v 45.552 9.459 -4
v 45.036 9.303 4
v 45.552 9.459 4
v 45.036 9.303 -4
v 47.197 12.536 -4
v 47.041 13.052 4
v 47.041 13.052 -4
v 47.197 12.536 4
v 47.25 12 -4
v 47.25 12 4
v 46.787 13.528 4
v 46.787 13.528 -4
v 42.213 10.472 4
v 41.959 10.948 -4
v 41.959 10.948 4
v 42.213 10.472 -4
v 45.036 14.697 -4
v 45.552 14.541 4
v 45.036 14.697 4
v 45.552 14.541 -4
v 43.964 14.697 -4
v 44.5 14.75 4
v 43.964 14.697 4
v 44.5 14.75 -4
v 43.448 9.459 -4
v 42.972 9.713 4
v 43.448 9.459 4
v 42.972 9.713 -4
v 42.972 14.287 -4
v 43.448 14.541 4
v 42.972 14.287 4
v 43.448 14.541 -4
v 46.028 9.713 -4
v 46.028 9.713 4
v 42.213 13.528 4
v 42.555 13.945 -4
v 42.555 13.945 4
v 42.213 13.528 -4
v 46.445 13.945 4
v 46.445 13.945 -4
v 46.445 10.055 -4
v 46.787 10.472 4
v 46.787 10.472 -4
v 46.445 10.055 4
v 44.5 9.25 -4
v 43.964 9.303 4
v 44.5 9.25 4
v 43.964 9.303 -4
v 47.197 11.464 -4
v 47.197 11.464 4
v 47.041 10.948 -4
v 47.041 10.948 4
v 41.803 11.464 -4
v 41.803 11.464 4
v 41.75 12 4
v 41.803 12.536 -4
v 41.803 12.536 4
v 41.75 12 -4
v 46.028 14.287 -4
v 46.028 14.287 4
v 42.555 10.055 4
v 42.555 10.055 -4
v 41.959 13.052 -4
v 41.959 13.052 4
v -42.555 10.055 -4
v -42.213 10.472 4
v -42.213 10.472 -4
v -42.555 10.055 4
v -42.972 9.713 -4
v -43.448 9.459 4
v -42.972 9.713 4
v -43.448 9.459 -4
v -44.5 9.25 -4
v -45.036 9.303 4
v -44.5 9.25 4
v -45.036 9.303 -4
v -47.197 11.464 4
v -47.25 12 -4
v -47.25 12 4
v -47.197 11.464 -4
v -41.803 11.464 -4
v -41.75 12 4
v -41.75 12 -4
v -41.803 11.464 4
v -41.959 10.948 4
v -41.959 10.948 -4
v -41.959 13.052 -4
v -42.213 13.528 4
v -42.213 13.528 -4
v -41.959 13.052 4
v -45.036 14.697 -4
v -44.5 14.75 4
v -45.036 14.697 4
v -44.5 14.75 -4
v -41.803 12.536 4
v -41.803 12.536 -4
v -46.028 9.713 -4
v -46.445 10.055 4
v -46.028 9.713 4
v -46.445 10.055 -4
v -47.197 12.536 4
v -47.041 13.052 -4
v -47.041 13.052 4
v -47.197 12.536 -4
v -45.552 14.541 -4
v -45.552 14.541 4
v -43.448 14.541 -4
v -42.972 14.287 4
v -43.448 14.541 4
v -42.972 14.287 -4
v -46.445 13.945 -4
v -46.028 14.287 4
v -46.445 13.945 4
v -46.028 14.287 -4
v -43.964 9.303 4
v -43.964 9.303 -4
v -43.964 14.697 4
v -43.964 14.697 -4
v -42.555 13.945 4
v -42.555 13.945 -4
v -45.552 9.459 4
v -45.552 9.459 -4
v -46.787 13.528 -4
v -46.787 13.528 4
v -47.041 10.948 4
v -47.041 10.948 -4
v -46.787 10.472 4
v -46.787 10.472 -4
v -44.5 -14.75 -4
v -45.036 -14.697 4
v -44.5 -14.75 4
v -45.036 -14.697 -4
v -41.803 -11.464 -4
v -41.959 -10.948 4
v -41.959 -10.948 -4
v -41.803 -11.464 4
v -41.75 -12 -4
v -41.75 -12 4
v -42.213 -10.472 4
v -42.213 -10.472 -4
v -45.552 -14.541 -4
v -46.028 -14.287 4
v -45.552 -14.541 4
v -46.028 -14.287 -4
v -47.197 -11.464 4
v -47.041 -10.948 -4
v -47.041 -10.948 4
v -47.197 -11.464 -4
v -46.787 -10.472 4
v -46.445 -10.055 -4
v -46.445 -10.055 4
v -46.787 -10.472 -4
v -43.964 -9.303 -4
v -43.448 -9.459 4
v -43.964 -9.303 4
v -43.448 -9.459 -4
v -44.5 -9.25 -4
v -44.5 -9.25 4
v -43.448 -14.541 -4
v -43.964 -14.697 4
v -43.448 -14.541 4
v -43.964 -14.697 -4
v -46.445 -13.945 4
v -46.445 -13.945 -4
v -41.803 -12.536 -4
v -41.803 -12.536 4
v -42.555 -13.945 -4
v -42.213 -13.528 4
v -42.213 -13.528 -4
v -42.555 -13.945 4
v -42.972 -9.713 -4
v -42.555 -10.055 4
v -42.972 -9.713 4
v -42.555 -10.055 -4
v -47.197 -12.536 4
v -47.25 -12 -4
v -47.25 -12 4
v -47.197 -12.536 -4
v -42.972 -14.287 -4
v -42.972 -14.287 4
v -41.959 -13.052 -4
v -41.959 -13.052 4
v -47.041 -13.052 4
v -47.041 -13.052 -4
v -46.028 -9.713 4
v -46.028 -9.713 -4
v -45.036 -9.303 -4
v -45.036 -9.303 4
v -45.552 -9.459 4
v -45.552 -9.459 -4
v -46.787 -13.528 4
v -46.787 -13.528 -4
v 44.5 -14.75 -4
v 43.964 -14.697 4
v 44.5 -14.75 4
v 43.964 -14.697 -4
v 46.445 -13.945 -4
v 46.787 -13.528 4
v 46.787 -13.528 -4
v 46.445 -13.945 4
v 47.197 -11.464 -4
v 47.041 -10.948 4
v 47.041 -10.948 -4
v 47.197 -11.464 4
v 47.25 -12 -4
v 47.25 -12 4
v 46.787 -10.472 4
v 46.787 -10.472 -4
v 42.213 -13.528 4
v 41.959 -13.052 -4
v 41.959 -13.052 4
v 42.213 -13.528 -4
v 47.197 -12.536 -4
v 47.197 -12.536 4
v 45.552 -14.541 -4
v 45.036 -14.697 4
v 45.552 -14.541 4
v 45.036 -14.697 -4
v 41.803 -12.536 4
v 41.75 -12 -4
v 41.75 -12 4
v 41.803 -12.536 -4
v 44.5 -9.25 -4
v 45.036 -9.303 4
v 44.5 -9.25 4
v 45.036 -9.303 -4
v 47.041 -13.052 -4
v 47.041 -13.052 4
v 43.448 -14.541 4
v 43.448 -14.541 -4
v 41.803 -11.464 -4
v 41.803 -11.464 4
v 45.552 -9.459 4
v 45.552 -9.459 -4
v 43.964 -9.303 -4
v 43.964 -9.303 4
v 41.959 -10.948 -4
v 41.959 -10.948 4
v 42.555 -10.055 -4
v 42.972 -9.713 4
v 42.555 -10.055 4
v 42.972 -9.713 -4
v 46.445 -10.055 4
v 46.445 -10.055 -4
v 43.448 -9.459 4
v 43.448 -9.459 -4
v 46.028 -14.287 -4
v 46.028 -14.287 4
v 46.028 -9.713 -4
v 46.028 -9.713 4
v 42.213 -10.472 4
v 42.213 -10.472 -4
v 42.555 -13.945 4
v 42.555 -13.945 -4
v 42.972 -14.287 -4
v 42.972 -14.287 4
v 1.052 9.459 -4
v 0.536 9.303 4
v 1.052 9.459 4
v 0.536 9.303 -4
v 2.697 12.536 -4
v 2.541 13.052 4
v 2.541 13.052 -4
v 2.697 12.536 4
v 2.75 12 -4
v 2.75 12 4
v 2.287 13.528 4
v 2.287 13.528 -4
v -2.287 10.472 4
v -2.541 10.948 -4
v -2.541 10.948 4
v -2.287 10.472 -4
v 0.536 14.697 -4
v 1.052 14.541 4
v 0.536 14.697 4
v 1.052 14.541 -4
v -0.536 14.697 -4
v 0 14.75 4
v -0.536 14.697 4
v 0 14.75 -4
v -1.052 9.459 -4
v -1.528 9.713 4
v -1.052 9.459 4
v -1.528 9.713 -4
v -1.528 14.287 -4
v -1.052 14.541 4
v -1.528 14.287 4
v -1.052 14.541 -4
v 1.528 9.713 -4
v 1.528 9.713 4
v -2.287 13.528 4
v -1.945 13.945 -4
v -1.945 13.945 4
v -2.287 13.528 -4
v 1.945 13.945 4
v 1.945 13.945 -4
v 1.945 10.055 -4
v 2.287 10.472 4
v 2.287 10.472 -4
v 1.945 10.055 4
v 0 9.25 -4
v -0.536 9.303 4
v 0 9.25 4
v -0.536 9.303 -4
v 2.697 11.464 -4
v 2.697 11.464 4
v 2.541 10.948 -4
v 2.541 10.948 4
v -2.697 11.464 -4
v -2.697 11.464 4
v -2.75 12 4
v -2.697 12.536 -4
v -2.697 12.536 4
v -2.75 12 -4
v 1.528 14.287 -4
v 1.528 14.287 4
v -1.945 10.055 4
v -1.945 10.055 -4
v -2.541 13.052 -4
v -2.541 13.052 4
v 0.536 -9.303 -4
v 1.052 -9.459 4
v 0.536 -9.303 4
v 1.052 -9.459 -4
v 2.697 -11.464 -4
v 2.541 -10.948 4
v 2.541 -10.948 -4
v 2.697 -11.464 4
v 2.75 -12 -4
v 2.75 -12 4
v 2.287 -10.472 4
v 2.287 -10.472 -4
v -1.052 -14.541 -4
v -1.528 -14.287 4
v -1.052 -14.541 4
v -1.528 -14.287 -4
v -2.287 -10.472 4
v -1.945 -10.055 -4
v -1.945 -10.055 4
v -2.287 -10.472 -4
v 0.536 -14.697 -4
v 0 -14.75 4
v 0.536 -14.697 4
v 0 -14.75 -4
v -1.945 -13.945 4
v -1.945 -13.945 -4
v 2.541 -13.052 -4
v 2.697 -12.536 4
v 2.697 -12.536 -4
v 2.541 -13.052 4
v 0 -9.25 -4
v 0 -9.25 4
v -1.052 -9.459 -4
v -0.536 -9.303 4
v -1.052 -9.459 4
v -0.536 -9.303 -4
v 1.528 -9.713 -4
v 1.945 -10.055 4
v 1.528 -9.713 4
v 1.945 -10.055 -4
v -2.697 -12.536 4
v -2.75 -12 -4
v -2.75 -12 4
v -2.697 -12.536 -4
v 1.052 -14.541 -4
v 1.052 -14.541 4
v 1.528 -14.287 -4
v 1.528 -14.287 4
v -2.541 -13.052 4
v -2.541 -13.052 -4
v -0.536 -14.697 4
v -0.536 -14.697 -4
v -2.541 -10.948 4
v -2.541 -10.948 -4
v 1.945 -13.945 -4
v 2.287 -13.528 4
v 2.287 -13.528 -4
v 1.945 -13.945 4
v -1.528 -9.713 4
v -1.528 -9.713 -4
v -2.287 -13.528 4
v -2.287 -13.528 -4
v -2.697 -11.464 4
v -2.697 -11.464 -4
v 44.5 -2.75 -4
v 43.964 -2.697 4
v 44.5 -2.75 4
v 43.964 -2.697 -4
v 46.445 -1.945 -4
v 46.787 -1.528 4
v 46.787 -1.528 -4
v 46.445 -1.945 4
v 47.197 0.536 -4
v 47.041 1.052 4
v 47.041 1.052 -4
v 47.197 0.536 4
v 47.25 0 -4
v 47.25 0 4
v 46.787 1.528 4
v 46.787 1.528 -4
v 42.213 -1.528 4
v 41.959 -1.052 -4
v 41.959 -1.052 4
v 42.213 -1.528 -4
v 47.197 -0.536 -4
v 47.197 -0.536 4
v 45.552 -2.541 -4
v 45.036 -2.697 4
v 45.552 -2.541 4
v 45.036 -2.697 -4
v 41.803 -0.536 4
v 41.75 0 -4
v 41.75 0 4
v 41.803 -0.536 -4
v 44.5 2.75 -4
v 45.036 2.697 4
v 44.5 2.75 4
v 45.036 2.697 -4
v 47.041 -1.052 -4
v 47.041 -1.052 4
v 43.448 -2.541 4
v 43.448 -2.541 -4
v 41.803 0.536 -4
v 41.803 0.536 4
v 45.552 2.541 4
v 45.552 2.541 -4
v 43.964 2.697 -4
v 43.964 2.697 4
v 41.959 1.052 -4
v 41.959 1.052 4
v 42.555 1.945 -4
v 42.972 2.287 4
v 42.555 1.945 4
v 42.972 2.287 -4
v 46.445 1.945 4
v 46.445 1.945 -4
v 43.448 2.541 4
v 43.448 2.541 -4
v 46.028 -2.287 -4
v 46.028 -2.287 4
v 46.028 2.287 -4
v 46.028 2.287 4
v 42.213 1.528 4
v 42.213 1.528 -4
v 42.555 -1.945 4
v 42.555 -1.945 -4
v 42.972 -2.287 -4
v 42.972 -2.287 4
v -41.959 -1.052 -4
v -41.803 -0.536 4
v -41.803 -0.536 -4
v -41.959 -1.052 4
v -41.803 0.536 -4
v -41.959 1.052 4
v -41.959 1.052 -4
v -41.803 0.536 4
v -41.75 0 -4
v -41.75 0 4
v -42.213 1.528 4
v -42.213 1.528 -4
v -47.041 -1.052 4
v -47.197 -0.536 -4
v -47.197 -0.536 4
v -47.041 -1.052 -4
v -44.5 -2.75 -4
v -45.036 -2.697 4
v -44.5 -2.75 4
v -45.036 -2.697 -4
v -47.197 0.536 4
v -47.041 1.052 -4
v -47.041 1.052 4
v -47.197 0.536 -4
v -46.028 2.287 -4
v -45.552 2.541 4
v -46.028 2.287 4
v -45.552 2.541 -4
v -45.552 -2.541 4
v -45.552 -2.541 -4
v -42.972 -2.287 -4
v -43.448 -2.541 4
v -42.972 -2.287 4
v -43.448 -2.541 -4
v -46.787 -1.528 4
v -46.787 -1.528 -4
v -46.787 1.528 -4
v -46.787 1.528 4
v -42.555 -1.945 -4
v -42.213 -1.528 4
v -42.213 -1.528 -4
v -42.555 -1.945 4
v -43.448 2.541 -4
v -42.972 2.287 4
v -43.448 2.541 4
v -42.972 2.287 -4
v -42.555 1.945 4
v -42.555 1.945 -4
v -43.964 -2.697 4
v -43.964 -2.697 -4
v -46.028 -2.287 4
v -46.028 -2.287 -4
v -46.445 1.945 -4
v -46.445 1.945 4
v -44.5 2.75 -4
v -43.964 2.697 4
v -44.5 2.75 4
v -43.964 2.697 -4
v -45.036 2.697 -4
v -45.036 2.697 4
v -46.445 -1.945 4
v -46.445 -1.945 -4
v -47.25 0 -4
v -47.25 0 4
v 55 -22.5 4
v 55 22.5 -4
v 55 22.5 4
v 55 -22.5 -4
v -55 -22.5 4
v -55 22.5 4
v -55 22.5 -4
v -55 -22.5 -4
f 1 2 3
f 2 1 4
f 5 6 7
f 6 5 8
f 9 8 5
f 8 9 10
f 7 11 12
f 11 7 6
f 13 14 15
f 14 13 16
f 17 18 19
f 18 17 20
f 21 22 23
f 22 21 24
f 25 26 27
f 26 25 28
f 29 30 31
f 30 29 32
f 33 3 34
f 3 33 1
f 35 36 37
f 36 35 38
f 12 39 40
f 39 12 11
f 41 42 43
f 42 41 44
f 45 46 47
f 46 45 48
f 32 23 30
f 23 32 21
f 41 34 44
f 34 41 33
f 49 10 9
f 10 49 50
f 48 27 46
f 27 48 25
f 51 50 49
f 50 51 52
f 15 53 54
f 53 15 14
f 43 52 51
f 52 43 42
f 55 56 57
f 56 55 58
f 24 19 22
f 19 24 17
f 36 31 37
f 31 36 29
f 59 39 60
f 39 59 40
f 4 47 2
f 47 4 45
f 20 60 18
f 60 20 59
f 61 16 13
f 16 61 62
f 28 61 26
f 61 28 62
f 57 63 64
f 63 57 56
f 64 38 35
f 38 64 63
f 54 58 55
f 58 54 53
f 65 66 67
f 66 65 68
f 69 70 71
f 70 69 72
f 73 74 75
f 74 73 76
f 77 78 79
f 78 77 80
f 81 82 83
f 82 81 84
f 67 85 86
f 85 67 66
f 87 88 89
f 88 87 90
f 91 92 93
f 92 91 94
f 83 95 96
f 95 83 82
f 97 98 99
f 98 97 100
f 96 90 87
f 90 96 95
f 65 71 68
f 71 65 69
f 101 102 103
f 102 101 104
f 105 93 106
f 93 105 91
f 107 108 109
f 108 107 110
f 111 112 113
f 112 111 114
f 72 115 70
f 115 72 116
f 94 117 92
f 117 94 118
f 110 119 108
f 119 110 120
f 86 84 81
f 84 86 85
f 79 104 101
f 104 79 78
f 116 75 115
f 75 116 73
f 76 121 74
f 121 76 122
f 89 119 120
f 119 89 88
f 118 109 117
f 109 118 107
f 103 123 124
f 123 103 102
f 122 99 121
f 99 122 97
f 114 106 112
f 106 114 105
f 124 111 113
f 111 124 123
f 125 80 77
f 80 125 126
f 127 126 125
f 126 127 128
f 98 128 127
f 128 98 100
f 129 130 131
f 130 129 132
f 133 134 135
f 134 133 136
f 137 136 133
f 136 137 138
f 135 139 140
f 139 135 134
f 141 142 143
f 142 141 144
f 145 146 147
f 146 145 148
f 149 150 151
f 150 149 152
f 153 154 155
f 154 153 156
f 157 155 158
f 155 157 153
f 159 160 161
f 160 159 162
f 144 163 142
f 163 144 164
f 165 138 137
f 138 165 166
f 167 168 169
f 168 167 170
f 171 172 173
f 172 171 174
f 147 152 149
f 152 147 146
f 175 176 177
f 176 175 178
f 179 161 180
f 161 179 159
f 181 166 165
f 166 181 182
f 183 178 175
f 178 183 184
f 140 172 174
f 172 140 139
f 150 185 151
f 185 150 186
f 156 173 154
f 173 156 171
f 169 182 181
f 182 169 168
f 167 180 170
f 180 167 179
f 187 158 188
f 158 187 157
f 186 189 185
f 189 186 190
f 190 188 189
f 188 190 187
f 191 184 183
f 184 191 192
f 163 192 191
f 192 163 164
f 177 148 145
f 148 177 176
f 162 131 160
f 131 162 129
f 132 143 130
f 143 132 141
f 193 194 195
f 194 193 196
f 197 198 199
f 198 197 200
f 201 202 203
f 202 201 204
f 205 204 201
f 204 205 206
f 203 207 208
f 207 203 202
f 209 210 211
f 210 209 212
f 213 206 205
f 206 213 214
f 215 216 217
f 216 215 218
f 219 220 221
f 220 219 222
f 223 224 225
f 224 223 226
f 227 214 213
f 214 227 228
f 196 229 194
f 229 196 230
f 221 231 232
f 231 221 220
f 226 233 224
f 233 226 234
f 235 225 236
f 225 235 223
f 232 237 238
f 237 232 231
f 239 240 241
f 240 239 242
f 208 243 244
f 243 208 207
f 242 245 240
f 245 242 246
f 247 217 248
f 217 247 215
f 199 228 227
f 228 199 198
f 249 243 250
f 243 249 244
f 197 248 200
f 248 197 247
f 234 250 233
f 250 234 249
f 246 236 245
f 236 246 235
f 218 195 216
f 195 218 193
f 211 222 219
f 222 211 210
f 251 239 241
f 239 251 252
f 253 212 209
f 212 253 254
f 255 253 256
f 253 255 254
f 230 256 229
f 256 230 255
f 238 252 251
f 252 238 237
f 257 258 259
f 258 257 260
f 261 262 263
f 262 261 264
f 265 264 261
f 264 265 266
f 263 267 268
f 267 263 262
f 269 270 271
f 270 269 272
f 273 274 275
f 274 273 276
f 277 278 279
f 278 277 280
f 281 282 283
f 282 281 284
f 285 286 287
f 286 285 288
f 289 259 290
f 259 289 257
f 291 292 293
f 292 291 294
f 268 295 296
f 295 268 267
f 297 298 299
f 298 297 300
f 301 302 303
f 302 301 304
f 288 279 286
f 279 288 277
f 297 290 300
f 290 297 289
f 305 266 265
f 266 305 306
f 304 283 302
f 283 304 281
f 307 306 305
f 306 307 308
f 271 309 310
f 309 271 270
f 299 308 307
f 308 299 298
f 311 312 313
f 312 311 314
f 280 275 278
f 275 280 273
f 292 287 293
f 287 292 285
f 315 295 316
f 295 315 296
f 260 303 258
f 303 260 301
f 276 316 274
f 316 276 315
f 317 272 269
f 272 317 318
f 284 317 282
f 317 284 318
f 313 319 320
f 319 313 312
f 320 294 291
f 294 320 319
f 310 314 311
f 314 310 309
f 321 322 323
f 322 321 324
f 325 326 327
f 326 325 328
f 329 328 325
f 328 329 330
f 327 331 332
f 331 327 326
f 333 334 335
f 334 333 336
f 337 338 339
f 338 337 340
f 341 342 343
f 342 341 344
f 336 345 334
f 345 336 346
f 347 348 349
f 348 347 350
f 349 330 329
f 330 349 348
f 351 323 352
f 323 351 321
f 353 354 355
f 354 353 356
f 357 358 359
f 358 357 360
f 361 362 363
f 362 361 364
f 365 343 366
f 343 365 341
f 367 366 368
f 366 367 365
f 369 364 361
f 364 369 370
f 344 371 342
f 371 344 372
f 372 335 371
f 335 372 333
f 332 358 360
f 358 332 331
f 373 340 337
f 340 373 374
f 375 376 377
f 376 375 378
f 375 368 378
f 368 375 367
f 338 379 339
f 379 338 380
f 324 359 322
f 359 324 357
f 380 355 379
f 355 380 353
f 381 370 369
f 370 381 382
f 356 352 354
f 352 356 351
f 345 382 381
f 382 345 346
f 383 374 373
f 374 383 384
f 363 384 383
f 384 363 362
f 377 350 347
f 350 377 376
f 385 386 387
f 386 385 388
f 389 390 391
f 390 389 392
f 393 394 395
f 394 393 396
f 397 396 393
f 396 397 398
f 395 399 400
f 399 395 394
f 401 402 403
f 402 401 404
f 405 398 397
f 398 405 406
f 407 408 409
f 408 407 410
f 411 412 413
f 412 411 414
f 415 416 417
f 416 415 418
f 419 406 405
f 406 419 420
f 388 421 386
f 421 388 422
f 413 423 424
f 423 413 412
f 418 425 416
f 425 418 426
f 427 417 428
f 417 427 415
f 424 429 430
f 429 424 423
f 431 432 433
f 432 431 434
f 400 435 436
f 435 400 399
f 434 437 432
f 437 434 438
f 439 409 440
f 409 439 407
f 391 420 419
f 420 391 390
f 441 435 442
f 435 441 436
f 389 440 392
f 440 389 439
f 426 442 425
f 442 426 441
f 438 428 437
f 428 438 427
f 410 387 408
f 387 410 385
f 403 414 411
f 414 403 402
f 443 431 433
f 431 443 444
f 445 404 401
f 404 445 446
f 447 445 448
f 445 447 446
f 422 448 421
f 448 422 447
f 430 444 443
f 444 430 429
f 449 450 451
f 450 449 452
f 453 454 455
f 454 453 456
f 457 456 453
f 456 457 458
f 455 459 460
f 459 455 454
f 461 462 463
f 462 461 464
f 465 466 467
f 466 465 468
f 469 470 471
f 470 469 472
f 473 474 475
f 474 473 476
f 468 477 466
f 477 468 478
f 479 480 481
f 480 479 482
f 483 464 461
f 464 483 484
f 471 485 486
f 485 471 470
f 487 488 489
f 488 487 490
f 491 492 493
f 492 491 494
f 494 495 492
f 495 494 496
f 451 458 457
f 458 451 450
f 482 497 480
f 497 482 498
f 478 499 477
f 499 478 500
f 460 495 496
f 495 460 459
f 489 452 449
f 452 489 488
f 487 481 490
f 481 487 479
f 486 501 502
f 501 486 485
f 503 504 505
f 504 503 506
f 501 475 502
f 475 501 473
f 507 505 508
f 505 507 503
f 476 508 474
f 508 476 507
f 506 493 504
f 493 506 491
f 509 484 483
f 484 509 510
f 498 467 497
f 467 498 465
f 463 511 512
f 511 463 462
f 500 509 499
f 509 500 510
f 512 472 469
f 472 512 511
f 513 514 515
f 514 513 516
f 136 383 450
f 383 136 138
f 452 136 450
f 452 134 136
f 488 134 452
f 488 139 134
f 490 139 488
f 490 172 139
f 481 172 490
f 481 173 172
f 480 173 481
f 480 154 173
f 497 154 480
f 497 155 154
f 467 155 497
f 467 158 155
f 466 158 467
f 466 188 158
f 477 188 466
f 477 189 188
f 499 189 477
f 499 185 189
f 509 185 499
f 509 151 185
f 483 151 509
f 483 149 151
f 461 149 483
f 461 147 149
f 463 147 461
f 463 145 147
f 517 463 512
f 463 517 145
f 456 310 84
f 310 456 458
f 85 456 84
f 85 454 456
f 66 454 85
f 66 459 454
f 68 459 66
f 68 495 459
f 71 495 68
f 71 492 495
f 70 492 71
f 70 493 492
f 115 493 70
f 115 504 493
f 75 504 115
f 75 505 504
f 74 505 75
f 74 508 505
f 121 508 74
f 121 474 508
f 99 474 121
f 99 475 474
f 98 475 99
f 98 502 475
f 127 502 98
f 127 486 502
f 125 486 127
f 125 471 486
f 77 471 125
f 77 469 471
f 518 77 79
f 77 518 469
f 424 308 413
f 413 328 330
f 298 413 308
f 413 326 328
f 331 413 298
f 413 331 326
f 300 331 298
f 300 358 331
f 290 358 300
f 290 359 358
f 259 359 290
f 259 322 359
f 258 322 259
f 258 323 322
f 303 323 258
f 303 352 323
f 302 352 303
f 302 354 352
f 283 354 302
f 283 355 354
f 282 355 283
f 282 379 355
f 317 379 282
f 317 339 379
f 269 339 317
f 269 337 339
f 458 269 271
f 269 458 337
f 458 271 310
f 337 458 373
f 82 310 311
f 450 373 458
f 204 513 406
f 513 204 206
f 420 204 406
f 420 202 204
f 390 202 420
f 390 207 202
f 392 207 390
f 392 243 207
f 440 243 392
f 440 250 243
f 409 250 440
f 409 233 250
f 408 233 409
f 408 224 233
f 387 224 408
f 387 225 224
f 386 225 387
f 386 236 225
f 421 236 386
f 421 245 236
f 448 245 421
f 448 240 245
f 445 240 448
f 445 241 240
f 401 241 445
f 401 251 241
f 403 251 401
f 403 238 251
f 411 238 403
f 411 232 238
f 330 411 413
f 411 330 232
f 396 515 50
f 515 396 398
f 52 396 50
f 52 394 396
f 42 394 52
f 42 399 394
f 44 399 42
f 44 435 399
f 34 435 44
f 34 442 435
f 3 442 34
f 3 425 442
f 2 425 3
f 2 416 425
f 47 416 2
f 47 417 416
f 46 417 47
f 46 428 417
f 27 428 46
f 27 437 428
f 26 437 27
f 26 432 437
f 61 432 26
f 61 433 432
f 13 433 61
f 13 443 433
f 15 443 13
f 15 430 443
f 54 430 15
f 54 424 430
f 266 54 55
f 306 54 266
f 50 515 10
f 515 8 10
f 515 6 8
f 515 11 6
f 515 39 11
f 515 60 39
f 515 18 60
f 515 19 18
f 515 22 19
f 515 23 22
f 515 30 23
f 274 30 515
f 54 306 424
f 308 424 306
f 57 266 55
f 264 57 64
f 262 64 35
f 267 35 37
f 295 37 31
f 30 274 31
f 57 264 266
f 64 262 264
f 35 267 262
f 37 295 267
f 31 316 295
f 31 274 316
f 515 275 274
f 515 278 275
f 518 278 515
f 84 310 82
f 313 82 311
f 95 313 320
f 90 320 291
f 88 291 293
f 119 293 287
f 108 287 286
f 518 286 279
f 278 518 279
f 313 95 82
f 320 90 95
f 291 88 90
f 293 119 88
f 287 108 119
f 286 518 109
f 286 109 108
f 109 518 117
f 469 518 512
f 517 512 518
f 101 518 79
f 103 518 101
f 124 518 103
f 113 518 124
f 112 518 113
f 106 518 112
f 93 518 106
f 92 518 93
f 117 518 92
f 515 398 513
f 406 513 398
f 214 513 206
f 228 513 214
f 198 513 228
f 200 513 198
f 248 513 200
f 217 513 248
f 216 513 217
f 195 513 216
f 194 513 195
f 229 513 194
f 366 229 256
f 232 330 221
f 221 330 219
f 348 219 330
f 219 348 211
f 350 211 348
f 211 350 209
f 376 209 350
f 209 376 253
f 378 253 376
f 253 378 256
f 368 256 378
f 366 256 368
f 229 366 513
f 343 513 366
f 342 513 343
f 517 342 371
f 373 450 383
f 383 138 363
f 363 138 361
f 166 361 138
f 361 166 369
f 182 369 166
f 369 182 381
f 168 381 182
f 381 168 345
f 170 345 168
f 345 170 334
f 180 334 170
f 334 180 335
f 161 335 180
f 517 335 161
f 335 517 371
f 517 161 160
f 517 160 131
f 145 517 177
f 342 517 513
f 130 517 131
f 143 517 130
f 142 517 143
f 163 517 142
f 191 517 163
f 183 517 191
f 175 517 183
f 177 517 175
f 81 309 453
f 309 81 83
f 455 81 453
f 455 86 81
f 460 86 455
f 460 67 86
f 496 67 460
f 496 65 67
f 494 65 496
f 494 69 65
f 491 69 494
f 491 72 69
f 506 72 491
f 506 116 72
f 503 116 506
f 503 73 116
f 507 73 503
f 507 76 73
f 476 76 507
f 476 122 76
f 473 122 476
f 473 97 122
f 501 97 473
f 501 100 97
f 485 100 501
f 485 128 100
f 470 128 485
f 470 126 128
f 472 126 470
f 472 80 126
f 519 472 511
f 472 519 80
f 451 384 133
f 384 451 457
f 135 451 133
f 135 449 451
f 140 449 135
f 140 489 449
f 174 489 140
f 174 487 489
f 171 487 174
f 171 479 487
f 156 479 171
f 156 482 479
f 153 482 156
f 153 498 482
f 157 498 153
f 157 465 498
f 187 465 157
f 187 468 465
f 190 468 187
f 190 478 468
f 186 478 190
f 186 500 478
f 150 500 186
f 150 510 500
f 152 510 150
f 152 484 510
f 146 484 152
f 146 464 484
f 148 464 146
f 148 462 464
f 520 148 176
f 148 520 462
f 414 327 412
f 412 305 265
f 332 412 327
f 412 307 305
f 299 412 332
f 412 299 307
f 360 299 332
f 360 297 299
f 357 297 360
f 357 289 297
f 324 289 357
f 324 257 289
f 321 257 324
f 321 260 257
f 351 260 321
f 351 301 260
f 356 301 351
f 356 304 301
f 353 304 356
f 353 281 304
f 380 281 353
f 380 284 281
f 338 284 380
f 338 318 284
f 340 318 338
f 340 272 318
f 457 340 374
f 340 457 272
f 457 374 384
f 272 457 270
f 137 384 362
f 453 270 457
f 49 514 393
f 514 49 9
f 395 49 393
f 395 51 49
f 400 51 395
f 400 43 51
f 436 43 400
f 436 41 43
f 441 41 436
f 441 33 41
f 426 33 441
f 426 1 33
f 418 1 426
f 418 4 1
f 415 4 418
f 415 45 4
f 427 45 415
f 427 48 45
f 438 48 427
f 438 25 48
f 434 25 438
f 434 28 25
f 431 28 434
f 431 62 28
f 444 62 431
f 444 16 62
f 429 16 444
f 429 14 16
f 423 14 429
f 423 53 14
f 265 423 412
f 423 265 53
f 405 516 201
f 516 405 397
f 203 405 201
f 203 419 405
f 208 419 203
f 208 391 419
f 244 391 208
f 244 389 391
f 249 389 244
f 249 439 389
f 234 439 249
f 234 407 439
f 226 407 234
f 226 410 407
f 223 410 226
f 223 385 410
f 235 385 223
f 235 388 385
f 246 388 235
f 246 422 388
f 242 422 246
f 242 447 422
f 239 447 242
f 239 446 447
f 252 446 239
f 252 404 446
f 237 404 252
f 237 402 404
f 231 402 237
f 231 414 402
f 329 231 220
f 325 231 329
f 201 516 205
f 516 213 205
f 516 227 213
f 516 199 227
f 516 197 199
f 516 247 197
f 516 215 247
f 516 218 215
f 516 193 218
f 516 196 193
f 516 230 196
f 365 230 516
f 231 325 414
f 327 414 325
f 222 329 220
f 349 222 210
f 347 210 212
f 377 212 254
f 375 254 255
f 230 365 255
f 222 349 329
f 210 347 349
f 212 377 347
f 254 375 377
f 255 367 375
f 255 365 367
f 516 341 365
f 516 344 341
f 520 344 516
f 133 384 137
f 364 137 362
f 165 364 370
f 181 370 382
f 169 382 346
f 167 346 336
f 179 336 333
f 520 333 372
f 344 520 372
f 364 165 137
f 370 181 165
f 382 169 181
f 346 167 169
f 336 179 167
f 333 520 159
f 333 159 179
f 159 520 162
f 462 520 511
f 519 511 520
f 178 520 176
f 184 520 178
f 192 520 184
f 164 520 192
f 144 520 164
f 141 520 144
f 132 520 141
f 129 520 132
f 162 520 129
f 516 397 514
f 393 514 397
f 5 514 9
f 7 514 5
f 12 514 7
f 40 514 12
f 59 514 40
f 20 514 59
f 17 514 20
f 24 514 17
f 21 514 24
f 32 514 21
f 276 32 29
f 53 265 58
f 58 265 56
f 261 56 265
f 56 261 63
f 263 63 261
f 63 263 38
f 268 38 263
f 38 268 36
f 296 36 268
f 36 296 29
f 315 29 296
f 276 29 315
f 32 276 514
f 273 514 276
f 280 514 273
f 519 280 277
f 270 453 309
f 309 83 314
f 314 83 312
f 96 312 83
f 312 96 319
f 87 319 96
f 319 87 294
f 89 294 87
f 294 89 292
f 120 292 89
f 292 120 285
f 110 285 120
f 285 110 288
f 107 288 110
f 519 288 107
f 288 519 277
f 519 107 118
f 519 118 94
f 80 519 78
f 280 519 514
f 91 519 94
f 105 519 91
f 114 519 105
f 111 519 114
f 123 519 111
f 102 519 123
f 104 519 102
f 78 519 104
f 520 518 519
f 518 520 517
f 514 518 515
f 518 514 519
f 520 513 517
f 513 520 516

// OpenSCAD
$fn = 32;

// ----------------------------------------------------------------------
// Corner plate 110 x 45 x 8
// 8 holes, centres taken from the edge offset
// ----------------------------------------------------------------------

// --- parameters (mm) ---
plate = [110, 45, 8];  // overall size (x, y, z)
holes = 8;             // number of holes the drawing asks for
hole_d = 5.5;          // hole diameter
edge = 10.5;           // hole centre offset from the plate edge

// --- derived feature positions (mm) ---
corner_x = plate[0] / 2 - edge;  // = 44.5   corner hole X
corner_y = plate[1] / 2 - edge;  // = 12   corner hole Y
feature_centers = [
  [corner_x, corner_y],
  [-corner_x, corner_y],
  [-corner_x, -corner_y],
  [corner_x, -corner_y],
  [0, corner_y],
  [0, -corner_y],
  [corner_x, 0],
  [-corner_x, 0]
];   // hole centres the loop below drills

// plate outline, every hole drilled through with the same cutters
difference() {
  cube(plate, center = true);
  for (centre = feature_centers)
    translate([centre[0], centre[1], 0])
      cylinder(d = hole_d, h = plate[2] + 2, center = true);
}
